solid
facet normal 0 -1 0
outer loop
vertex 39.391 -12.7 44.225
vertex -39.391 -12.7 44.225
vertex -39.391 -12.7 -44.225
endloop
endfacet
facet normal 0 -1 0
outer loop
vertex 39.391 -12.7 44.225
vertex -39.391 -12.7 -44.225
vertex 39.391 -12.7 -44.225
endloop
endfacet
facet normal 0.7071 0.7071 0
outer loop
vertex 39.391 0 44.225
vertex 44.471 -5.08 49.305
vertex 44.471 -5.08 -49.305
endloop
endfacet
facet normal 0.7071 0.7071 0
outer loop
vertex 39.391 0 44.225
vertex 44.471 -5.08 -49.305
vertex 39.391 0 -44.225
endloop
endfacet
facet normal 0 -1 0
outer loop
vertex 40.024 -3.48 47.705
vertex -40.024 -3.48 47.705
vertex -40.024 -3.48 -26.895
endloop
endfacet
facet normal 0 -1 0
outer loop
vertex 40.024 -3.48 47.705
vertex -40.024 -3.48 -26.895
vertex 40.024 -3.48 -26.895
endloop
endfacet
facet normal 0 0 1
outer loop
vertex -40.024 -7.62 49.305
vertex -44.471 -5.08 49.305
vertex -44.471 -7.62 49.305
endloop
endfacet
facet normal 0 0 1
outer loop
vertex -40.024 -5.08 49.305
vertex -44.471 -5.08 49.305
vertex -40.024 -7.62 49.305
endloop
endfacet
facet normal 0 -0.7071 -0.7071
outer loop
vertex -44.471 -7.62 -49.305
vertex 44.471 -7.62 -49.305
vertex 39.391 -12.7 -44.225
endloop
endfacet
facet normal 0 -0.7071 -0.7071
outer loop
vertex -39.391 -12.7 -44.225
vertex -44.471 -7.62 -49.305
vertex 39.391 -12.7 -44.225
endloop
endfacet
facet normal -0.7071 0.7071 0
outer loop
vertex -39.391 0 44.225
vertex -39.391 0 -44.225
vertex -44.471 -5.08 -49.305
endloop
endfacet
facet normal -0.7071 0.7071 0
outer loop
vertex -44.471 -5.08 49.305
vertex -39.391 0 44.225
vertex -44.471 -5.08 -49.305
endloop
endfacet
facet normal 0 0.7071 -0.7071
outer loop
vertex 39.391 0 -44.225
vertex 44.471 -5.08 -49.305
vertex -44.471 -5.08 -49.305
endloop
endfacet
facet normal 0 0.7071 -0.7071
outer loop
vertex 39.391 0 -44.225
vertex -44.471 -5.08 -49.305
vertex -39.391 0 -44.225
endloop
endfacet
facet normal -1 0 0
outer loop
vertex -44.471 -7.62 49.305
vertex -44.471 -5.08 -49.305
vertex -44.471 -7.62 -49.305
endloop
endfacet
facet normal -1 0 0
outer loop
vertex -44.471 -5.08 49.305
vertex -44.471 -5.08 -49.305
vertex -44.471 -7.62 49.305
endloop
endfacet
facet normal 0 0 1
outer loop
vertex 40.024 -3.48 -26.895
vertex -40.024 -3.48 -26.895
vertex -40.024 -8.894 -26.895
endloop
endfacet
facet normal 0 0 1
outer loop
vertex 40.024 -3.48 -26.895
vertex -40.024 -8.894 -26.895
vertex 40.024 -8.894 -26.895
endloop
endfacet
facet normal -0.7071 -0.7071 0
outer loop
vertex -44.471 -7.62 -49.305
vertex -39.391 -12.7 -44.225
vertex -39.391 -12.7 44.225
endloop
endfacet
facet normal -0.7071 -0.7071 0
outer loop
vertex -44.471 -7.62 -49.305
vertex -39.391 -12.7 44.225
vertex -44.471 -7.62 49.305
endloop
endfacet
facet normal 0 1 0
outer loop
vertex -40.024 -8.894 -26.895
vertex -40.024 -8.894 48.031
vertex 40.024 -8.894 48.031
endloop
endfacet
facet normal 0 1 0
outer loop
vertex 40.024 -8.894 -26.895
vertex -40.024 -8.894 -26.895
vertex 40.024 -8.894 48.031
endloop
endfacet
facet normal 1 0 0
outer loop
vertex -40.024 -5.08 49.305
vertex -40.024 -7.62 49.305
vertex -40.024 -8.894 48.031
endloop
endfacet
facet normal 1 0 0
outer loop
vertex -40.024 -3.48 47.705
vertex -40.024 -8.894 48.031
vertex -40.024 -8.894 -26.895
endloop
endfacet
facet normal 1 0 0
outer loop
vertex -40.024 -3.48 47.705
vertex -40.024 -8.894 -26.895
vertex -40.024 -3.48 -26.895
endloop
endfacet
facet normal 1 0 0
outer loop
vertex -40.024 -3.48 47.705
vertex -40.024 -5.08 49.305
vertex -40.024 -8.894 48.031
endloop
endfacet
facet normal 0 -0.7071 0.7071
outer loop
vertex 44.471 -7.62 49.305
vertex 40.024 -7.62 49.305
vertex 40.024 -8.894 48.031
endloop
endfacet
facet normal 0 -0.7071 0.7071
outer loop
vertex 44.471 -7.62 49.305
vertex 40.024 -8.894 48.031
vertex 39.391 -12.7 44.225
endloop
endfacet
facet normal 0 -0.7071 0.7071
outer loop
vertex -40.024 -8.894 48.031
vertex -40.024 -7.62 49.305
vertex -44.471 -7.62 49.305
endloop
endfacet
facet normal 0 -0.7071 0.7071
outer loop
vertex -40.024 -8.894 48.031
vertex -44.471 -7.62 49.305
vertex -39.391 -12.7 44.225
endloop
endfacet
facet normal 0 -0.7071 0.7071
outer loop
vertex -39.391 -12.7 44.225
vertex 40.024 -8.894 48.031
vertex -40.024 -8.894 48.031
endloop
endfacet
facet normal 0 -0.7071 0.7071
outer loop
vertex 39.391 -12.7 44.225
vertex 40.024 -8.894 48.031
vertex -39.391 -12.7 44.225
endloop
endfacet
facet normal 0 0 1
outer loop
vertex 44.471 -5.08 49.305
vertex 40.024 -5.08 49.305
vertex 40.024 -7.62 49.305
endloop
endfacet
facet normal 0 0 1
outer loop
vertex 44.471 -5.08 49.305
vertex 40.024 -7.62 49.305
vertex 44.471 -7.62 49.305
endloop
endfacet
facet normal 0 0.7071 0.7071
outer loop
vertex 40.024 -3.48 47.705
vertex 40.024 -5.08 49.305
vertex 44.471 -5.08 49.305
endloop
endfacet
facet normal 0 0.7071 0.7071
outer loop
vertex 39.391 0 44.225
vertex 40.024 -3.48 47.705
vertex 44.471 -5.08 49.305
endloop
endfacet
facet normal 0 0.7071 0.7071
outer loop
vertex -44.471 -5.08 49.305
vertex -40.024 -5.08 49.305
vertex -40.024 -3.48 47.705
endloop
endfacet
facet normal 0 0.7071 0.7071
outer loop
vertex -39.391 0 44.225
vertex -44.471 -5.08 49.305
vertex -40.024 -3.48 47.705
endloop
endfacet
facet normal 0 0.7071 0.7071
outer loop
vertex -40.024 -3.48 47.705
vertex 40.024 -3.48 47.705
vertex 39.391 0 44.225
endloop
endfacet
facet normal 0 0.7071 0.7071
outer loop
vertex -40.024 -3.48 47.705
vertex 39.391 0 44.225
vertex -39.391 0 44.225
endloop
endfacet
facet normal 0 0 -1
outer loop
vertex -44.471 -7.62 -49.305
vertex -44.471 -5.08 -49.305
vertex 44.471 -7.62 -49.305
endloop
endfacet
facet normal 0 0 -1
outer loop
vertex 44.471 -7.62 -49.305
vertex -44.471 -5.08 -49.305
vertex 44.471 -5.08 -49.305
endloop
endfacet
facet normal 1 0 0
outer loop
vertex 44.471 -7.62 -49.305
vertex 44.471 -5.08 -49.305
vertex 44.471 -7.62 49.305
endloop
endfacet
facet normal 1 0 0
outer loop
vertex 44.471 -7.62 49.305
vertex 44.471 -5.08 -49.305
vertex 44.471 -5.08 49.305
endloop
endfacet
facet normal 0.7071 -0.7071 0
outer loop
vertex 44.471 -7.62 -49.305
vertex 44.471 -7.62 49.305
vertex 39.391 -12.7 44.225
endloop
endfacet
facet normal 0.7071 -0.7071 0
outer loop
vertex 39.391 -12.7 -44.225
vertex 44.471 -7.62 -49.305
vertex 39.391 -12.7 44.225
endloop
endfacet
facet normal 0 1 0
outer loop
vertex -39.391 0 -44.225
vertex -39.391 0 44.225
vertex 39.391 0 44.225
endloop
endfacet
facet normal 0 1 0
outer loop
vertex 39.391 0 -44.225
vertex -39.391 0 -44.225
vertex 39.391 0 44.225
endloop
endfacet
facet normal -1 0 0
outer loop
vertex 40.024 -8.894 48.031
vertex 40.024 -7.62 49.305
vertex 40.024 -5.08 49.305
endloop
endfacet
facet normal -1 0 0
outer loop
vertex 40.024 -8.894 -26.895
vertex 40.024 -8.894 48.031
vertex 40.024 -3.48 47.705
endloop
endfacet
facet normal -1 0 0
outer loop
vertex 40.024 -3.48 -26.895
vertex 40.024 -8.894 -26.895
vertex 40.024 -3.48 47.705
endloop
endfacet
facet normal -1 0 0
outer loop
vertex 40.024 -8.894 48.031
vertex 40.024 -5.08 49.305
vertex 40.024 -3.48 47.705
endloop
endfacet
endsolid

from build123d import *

# Parameters (mm, degrees)
F0_W        = 88.9418646693
F0_H        = 98.6094549298
F1_DEPTH    = 12.7
F2_W        = 80.0476707518
F2_H        = 5.413854029
F3_DEPTH    = 76.2
F4_T1_DEPTH = 124.7377540876
F4_T3_DEPTH = 115.0701638271


# Not quite as in the source:
# - a fillet or chamfer that OpenCascade refuses, or shapes differently, is made with other operations: its cross-section is extruded or revolved along the edge and cut away or added


with BuildPart() as f1:
    # F0 (on Front) → F1 (new body)
    with BuildSketch(Plane.XZ):
        Rectangle(F0_W, F0_H)
    extrude(amount=F1_DEPTH)

    # F2 (on face) → F3 (cut)
    with BuildSketch(Plane.XY.offset(49.3047274649)):
        with Locations((-1.8626e-06, -6.1872594524)):
            Rectangle(F2_W, F2_H)
    extrude(amount=-F3_DEPTH, mode=Mode.SUBTRACT)

    # F4: chamfer of 5.08 on 8 edges, made by hand

    # F4_s2 → F4_t1 (cut)
    with BuildSketch(Plane.XY.offset(-62.3688770438)):
        Polygon((44.4709323347, -5.08), (39.3909323347, 0), (44.4709323347, 0), align=None)
        Polygon((-39.3909323347, 0), (-44.4709323347, -5.08), (-44.4709323347, 0), align=None)
        Polygon((44.4709323347, -7.62), (39.3909323347, -12.7), (44.4709323347, -12.7), align=None)
        Polygon((-39.3909323347, -12.7), (-44.4709323347, -7.62), (-44.4709323347, -12.7), align=None)
    extrude(amount=F4_T1_DEPTH, mode=Mode.SUBTRACT)

    # F4_s4 → F4_t3 (cut)
    with BuildSketch(Plane.YZ.offset(-57.5350819135)):
        Polygon((-5.08, 49.3047274649), (0, 44.2247274649), (0, 49.3047274649), align=None)
        Polygon((-5.08, -49.3047274649), (0, -44.2247274649), (0, -49.3047274649), align=None)
        Polygon((-7.62, 49.3047274649), (-12.7, 44.2247274649), (-12.7, 49.3047274649), align=None)
        Polygon((-7.62, -49.3047274649), (-12.7, -44.2247274649), (-12.7, -49.3047274649), align=None)
    extrude(amount=F4_T3_DEPTH, mode=Mode.SUBTRACT)


solid = f1.part
